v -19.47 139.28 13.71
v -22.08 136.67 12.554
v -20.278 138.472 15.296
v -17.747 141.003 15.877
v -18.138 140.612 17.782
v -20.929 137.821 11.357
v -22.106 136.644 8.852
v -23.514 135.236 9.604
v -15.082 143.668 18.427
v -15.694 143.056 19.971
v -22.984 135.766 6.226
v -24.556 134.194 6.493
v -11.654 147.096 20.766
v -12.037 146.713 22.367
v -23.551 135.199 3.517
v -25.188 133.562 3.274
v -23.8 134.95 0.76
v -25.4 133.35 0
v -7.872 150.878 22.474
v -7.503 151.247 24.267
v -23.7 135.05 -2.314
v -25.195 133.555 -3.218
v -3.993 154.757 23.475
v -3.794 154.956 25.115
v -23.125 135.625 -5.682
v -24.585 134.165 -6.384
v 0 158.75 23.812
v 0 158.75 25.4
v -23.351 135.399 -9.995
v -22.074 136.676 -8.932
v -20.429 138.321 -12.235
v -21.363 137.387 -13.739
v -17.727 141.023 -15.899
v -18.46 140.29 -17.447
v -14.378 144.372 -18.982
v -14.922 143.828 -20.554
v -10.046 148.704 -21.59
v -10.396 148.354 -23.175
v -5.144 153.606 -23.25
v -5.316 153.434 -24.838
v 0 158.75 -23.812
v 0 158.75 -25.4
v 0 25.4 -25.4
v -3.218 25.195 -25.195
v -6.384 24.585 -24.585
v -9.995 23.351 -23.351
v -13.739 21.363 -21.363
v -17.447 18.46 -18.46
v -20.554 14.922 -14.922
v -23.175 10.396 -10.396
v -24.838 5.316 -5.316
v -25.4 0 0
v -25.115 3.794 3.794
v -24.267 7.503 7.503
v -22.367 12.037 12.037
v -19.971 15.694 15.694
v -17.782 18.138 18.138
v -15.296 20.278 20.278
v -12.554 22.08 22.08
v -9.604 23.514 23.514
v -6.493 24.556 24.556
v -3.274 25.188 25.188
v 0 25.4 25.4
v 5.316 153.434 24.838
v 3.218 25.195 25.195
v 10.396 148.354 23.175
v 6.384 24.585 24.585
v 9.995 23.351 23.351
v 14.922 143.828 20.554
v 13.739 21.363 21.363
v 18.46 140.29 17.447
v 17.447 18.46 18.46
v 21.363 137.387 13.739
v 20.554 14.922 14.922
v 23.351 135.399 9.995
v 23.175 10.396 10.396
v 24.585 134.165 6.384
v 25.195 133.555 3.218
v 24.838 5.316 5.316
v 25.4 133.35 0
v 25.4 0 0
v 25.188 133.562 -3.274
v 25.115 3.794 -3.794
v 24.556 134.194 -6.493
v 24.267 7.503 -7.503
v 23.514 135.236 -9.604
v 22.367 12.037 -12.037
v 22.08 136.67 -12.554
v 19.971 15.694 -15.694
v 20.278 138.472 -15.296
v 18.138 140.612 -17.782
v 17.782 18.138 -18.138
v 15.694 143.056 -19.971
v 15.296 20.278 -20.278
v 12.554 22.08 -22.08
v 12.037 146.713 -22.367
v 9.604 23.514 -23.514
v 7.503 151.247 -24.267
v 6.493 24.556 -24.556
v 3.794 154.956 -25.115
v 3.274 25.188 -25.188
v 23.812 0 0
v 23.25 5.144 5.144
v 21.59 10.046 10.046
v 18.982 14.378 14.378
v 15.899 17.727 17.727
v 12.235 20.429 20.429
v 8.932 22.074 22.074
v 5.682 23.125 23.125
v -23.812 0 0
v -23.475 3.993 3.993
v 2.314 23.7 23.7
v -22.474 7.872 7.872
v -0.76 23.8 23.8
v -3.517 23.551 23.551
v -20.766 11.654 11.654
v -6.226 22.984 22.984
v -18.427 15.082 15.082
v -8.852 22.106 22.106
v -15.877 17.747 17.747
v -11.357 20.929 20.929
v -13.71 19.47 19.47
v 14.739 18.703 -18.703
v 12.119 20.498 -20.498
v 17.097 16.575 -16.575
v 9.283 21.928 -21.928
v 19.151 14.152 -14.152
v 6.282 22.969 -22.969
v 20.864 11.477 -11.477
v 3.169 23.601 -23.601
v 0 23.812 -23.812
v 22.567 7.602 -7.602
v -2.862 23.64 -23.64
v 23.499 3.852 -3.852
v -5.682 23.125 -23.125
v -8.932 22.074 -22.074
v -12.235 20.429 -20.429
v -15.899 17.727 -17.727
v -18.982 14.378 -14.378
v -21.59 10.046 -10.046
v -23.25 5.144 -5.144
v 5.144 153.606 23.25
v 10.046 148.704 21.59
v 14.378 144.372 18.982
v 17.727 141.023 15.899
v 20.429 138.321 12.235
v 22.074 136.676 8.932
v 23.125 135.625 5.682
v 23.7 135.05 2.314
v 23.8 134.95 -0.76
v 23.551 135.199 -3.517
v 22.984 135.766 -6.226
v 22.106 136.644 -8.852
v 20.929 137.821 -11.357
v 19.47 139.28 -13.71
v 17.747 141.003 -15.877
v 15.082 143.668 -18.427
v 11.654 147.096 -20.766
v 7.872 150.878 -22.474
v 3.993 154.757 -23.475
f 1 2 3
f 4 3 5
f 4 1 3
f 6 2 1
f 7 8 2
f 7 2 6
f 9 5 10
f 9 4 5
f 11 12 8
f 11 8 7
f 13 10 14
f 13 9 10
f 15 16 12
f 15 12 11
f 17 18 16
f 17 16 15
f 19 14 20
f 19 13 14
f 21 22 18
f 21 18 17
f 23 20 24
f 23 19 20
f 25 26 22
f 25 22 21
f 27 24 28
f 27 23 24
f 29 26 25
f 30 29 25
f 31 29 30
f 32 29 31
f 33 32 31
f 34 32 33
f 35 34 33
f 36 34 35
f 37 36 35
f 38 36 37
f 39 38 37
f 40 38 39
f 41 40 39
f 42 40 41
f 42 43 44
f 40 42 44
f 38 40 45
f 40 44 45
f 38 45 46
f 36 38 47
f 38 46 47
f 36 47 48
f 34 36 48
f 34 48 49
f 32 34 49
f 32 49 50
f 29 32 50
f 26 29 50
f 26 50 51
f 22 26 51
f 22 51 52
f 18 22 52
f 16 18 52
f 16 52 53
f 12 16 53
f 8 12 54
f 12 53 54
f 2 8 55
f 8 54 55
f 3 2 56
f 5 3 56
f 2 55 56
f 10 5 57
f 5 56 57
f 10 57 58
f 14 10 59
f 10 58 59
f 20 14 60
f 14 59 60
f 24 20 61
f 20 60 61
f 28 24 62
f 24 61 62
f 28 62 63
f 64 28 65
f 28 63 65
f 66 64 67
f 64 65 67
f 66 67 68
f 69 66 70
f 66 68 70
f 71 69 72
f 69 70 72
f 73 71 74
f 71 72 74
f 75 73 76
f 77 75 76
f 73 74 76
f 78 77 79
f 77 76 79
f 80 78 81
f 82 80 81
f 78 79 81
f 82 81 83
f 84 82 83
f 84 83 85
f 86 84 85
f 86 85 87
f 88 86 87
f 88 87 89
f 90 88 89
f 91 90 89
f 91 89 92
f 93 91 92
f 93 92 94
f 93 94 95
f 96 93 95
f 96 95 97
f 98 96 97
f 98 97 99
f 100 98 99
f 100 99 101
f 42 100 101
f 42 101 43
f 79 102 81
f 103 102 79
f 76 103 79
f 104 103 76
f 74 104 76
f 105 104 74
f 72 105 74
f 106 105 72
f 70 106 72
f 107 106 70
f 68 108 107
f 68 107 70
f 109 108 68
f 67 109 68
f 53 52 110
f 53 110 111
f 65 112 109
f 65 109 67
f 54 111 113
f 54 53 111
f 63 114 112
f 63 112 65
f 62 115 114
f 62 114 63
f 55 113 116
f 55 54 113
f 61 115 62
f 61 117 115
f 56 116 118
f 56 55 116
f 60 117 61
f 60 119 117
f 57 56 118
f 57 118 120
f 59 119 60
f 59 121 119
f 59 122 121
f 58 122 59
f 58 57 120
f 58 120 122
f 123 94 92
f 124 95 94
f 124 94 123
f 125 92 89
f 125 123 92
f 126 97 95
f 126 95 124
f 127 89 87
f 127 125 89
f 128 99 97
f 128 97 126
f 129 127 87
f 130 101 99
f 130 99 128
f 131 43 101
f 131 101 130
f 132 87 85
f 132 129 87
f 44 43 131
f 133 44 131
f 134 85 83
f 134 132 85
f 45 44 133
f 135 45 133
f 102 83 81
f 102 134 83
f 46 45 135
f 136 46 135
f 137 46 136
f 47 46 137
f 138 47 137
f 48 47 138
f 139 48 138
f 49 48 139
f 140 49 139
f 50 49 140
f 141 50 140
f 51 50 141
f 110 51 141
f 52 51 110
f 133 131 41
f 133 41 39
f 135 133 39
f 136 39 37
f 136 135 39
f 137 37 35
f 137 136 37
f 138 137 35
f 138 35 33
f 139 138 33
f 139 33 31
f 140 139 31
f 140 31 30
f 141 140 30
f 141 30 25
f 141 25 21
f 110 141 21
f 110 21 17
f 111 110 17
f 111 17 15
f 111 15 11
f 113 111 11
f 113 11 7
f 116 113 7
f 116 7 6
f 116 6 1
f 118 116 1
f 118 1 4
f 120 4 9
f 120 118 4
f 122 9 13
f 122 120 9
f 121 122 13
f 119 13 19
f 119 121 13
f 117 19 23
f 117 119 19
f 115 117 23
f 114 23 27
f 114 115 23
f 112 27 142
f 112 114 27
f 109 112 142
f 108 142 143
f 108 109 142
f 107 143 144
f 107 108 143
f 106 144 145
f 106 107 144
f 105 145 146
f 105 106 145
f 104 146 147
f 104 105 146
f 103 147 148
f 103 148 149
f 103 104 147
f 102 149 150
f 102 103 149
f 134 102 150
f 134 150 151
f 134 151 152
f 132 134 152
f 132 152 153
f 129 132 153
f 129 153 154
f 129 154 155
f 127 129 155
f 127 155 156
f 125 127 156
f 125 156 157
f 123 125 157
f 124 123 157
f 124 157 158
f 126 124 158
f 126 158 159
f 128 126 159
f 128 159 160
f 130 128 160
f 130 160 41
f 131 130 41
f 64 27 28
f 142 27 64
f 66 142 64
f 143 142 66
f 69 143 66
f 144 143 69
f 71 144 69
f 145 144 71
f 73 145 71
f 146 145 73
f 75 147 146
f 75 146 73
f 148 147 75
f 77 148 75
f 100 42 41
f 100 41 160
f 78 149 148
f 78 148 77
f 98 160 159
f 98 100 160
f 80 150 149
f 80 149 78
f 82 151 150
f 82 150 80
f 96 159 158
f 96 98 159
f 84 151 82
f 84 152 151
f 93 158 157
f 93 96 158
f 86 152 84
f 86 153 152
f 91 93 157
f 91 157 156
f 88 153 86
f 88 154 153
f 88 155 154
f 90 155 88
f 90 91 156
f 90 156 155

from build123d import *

# Parameters (mm, degrees)
SKETCH1_R               = 25.4
SKETCH1_R_2             = 23.8125
BOSS_EXTRUDE1_DEPTH     = 158.75
CUT_EXTRUDE1_DEPTH      = 163.763271348
CUT_EXTRUDE1_DEPTH_BACK = 163.763271348
CUT_EXTRUDE2_DEPTH      = 163.763271348
CUT_EXTRUDE2_DEPTH_BACK = 163.763271348


with BuildPart() as part:
    # Sketch1 → Boss-Extrude1 (new body)
    with BuildSketch(Plane(origin=(0, 0, 0), x_dir=(1, 0, 0), z_dir=(0, 1, 0))):
        with Locations(Location((0, 0, 0), (0, 0, 90))):
            Circle(SKETCH1_R)
        with Locations(Location((0, 0, 0), (0, 0, 90))):
            Circle(SKETCH1_R_2, mode=Mode.SUBTRACT)
    extrude(amount=BOSS_EXTRUDE1_DEPTH)

    # Sketch2 → Cut-Extrude1 (cut, two sides: drawn at the far end of the back side and taken through both)
    with BuildSketch(Plane.XY.offset(-CUT_EXTRUDE1_DEPTH_BACK)):
        Polygon((25.4, 133.35), (25.4, 158.75), (-0.960093291, 166.540490079), (-25.4, 158.75), (-25.4, 133.35), (0, 158.75), align=None)
    extrude(amount=CUT_EXTRUDE1_DEPTH + CUT_EXTRUDE1_DEPTH_BACK, mode=Mode.SUBTRACT)

    # Sketch3 → Cut-Extrude2 (cut, two sides: drawn at the far end of the back side and taken through both)
    with BuildSketch(Plane(origin=(0, 0, 0), x_dir=(0, 0, -1), z_dir=(1, 0, 0)).offset(-CUT_EXTRUDE2_DEPTH_BACK)):
        Polygon((-25.4, 25.4), (-25.4, 0), (0.032632353, -12.112837501), (25.4, 0), (25.4, 25.4), (0, 0), align=None)
    extrude(amount=CUT_EXTRUDE2_DEPTH + CUT_EXTRUDE2_DEPTH_BACK, mode=Mode.SUBTRACT)


solid = part.part
